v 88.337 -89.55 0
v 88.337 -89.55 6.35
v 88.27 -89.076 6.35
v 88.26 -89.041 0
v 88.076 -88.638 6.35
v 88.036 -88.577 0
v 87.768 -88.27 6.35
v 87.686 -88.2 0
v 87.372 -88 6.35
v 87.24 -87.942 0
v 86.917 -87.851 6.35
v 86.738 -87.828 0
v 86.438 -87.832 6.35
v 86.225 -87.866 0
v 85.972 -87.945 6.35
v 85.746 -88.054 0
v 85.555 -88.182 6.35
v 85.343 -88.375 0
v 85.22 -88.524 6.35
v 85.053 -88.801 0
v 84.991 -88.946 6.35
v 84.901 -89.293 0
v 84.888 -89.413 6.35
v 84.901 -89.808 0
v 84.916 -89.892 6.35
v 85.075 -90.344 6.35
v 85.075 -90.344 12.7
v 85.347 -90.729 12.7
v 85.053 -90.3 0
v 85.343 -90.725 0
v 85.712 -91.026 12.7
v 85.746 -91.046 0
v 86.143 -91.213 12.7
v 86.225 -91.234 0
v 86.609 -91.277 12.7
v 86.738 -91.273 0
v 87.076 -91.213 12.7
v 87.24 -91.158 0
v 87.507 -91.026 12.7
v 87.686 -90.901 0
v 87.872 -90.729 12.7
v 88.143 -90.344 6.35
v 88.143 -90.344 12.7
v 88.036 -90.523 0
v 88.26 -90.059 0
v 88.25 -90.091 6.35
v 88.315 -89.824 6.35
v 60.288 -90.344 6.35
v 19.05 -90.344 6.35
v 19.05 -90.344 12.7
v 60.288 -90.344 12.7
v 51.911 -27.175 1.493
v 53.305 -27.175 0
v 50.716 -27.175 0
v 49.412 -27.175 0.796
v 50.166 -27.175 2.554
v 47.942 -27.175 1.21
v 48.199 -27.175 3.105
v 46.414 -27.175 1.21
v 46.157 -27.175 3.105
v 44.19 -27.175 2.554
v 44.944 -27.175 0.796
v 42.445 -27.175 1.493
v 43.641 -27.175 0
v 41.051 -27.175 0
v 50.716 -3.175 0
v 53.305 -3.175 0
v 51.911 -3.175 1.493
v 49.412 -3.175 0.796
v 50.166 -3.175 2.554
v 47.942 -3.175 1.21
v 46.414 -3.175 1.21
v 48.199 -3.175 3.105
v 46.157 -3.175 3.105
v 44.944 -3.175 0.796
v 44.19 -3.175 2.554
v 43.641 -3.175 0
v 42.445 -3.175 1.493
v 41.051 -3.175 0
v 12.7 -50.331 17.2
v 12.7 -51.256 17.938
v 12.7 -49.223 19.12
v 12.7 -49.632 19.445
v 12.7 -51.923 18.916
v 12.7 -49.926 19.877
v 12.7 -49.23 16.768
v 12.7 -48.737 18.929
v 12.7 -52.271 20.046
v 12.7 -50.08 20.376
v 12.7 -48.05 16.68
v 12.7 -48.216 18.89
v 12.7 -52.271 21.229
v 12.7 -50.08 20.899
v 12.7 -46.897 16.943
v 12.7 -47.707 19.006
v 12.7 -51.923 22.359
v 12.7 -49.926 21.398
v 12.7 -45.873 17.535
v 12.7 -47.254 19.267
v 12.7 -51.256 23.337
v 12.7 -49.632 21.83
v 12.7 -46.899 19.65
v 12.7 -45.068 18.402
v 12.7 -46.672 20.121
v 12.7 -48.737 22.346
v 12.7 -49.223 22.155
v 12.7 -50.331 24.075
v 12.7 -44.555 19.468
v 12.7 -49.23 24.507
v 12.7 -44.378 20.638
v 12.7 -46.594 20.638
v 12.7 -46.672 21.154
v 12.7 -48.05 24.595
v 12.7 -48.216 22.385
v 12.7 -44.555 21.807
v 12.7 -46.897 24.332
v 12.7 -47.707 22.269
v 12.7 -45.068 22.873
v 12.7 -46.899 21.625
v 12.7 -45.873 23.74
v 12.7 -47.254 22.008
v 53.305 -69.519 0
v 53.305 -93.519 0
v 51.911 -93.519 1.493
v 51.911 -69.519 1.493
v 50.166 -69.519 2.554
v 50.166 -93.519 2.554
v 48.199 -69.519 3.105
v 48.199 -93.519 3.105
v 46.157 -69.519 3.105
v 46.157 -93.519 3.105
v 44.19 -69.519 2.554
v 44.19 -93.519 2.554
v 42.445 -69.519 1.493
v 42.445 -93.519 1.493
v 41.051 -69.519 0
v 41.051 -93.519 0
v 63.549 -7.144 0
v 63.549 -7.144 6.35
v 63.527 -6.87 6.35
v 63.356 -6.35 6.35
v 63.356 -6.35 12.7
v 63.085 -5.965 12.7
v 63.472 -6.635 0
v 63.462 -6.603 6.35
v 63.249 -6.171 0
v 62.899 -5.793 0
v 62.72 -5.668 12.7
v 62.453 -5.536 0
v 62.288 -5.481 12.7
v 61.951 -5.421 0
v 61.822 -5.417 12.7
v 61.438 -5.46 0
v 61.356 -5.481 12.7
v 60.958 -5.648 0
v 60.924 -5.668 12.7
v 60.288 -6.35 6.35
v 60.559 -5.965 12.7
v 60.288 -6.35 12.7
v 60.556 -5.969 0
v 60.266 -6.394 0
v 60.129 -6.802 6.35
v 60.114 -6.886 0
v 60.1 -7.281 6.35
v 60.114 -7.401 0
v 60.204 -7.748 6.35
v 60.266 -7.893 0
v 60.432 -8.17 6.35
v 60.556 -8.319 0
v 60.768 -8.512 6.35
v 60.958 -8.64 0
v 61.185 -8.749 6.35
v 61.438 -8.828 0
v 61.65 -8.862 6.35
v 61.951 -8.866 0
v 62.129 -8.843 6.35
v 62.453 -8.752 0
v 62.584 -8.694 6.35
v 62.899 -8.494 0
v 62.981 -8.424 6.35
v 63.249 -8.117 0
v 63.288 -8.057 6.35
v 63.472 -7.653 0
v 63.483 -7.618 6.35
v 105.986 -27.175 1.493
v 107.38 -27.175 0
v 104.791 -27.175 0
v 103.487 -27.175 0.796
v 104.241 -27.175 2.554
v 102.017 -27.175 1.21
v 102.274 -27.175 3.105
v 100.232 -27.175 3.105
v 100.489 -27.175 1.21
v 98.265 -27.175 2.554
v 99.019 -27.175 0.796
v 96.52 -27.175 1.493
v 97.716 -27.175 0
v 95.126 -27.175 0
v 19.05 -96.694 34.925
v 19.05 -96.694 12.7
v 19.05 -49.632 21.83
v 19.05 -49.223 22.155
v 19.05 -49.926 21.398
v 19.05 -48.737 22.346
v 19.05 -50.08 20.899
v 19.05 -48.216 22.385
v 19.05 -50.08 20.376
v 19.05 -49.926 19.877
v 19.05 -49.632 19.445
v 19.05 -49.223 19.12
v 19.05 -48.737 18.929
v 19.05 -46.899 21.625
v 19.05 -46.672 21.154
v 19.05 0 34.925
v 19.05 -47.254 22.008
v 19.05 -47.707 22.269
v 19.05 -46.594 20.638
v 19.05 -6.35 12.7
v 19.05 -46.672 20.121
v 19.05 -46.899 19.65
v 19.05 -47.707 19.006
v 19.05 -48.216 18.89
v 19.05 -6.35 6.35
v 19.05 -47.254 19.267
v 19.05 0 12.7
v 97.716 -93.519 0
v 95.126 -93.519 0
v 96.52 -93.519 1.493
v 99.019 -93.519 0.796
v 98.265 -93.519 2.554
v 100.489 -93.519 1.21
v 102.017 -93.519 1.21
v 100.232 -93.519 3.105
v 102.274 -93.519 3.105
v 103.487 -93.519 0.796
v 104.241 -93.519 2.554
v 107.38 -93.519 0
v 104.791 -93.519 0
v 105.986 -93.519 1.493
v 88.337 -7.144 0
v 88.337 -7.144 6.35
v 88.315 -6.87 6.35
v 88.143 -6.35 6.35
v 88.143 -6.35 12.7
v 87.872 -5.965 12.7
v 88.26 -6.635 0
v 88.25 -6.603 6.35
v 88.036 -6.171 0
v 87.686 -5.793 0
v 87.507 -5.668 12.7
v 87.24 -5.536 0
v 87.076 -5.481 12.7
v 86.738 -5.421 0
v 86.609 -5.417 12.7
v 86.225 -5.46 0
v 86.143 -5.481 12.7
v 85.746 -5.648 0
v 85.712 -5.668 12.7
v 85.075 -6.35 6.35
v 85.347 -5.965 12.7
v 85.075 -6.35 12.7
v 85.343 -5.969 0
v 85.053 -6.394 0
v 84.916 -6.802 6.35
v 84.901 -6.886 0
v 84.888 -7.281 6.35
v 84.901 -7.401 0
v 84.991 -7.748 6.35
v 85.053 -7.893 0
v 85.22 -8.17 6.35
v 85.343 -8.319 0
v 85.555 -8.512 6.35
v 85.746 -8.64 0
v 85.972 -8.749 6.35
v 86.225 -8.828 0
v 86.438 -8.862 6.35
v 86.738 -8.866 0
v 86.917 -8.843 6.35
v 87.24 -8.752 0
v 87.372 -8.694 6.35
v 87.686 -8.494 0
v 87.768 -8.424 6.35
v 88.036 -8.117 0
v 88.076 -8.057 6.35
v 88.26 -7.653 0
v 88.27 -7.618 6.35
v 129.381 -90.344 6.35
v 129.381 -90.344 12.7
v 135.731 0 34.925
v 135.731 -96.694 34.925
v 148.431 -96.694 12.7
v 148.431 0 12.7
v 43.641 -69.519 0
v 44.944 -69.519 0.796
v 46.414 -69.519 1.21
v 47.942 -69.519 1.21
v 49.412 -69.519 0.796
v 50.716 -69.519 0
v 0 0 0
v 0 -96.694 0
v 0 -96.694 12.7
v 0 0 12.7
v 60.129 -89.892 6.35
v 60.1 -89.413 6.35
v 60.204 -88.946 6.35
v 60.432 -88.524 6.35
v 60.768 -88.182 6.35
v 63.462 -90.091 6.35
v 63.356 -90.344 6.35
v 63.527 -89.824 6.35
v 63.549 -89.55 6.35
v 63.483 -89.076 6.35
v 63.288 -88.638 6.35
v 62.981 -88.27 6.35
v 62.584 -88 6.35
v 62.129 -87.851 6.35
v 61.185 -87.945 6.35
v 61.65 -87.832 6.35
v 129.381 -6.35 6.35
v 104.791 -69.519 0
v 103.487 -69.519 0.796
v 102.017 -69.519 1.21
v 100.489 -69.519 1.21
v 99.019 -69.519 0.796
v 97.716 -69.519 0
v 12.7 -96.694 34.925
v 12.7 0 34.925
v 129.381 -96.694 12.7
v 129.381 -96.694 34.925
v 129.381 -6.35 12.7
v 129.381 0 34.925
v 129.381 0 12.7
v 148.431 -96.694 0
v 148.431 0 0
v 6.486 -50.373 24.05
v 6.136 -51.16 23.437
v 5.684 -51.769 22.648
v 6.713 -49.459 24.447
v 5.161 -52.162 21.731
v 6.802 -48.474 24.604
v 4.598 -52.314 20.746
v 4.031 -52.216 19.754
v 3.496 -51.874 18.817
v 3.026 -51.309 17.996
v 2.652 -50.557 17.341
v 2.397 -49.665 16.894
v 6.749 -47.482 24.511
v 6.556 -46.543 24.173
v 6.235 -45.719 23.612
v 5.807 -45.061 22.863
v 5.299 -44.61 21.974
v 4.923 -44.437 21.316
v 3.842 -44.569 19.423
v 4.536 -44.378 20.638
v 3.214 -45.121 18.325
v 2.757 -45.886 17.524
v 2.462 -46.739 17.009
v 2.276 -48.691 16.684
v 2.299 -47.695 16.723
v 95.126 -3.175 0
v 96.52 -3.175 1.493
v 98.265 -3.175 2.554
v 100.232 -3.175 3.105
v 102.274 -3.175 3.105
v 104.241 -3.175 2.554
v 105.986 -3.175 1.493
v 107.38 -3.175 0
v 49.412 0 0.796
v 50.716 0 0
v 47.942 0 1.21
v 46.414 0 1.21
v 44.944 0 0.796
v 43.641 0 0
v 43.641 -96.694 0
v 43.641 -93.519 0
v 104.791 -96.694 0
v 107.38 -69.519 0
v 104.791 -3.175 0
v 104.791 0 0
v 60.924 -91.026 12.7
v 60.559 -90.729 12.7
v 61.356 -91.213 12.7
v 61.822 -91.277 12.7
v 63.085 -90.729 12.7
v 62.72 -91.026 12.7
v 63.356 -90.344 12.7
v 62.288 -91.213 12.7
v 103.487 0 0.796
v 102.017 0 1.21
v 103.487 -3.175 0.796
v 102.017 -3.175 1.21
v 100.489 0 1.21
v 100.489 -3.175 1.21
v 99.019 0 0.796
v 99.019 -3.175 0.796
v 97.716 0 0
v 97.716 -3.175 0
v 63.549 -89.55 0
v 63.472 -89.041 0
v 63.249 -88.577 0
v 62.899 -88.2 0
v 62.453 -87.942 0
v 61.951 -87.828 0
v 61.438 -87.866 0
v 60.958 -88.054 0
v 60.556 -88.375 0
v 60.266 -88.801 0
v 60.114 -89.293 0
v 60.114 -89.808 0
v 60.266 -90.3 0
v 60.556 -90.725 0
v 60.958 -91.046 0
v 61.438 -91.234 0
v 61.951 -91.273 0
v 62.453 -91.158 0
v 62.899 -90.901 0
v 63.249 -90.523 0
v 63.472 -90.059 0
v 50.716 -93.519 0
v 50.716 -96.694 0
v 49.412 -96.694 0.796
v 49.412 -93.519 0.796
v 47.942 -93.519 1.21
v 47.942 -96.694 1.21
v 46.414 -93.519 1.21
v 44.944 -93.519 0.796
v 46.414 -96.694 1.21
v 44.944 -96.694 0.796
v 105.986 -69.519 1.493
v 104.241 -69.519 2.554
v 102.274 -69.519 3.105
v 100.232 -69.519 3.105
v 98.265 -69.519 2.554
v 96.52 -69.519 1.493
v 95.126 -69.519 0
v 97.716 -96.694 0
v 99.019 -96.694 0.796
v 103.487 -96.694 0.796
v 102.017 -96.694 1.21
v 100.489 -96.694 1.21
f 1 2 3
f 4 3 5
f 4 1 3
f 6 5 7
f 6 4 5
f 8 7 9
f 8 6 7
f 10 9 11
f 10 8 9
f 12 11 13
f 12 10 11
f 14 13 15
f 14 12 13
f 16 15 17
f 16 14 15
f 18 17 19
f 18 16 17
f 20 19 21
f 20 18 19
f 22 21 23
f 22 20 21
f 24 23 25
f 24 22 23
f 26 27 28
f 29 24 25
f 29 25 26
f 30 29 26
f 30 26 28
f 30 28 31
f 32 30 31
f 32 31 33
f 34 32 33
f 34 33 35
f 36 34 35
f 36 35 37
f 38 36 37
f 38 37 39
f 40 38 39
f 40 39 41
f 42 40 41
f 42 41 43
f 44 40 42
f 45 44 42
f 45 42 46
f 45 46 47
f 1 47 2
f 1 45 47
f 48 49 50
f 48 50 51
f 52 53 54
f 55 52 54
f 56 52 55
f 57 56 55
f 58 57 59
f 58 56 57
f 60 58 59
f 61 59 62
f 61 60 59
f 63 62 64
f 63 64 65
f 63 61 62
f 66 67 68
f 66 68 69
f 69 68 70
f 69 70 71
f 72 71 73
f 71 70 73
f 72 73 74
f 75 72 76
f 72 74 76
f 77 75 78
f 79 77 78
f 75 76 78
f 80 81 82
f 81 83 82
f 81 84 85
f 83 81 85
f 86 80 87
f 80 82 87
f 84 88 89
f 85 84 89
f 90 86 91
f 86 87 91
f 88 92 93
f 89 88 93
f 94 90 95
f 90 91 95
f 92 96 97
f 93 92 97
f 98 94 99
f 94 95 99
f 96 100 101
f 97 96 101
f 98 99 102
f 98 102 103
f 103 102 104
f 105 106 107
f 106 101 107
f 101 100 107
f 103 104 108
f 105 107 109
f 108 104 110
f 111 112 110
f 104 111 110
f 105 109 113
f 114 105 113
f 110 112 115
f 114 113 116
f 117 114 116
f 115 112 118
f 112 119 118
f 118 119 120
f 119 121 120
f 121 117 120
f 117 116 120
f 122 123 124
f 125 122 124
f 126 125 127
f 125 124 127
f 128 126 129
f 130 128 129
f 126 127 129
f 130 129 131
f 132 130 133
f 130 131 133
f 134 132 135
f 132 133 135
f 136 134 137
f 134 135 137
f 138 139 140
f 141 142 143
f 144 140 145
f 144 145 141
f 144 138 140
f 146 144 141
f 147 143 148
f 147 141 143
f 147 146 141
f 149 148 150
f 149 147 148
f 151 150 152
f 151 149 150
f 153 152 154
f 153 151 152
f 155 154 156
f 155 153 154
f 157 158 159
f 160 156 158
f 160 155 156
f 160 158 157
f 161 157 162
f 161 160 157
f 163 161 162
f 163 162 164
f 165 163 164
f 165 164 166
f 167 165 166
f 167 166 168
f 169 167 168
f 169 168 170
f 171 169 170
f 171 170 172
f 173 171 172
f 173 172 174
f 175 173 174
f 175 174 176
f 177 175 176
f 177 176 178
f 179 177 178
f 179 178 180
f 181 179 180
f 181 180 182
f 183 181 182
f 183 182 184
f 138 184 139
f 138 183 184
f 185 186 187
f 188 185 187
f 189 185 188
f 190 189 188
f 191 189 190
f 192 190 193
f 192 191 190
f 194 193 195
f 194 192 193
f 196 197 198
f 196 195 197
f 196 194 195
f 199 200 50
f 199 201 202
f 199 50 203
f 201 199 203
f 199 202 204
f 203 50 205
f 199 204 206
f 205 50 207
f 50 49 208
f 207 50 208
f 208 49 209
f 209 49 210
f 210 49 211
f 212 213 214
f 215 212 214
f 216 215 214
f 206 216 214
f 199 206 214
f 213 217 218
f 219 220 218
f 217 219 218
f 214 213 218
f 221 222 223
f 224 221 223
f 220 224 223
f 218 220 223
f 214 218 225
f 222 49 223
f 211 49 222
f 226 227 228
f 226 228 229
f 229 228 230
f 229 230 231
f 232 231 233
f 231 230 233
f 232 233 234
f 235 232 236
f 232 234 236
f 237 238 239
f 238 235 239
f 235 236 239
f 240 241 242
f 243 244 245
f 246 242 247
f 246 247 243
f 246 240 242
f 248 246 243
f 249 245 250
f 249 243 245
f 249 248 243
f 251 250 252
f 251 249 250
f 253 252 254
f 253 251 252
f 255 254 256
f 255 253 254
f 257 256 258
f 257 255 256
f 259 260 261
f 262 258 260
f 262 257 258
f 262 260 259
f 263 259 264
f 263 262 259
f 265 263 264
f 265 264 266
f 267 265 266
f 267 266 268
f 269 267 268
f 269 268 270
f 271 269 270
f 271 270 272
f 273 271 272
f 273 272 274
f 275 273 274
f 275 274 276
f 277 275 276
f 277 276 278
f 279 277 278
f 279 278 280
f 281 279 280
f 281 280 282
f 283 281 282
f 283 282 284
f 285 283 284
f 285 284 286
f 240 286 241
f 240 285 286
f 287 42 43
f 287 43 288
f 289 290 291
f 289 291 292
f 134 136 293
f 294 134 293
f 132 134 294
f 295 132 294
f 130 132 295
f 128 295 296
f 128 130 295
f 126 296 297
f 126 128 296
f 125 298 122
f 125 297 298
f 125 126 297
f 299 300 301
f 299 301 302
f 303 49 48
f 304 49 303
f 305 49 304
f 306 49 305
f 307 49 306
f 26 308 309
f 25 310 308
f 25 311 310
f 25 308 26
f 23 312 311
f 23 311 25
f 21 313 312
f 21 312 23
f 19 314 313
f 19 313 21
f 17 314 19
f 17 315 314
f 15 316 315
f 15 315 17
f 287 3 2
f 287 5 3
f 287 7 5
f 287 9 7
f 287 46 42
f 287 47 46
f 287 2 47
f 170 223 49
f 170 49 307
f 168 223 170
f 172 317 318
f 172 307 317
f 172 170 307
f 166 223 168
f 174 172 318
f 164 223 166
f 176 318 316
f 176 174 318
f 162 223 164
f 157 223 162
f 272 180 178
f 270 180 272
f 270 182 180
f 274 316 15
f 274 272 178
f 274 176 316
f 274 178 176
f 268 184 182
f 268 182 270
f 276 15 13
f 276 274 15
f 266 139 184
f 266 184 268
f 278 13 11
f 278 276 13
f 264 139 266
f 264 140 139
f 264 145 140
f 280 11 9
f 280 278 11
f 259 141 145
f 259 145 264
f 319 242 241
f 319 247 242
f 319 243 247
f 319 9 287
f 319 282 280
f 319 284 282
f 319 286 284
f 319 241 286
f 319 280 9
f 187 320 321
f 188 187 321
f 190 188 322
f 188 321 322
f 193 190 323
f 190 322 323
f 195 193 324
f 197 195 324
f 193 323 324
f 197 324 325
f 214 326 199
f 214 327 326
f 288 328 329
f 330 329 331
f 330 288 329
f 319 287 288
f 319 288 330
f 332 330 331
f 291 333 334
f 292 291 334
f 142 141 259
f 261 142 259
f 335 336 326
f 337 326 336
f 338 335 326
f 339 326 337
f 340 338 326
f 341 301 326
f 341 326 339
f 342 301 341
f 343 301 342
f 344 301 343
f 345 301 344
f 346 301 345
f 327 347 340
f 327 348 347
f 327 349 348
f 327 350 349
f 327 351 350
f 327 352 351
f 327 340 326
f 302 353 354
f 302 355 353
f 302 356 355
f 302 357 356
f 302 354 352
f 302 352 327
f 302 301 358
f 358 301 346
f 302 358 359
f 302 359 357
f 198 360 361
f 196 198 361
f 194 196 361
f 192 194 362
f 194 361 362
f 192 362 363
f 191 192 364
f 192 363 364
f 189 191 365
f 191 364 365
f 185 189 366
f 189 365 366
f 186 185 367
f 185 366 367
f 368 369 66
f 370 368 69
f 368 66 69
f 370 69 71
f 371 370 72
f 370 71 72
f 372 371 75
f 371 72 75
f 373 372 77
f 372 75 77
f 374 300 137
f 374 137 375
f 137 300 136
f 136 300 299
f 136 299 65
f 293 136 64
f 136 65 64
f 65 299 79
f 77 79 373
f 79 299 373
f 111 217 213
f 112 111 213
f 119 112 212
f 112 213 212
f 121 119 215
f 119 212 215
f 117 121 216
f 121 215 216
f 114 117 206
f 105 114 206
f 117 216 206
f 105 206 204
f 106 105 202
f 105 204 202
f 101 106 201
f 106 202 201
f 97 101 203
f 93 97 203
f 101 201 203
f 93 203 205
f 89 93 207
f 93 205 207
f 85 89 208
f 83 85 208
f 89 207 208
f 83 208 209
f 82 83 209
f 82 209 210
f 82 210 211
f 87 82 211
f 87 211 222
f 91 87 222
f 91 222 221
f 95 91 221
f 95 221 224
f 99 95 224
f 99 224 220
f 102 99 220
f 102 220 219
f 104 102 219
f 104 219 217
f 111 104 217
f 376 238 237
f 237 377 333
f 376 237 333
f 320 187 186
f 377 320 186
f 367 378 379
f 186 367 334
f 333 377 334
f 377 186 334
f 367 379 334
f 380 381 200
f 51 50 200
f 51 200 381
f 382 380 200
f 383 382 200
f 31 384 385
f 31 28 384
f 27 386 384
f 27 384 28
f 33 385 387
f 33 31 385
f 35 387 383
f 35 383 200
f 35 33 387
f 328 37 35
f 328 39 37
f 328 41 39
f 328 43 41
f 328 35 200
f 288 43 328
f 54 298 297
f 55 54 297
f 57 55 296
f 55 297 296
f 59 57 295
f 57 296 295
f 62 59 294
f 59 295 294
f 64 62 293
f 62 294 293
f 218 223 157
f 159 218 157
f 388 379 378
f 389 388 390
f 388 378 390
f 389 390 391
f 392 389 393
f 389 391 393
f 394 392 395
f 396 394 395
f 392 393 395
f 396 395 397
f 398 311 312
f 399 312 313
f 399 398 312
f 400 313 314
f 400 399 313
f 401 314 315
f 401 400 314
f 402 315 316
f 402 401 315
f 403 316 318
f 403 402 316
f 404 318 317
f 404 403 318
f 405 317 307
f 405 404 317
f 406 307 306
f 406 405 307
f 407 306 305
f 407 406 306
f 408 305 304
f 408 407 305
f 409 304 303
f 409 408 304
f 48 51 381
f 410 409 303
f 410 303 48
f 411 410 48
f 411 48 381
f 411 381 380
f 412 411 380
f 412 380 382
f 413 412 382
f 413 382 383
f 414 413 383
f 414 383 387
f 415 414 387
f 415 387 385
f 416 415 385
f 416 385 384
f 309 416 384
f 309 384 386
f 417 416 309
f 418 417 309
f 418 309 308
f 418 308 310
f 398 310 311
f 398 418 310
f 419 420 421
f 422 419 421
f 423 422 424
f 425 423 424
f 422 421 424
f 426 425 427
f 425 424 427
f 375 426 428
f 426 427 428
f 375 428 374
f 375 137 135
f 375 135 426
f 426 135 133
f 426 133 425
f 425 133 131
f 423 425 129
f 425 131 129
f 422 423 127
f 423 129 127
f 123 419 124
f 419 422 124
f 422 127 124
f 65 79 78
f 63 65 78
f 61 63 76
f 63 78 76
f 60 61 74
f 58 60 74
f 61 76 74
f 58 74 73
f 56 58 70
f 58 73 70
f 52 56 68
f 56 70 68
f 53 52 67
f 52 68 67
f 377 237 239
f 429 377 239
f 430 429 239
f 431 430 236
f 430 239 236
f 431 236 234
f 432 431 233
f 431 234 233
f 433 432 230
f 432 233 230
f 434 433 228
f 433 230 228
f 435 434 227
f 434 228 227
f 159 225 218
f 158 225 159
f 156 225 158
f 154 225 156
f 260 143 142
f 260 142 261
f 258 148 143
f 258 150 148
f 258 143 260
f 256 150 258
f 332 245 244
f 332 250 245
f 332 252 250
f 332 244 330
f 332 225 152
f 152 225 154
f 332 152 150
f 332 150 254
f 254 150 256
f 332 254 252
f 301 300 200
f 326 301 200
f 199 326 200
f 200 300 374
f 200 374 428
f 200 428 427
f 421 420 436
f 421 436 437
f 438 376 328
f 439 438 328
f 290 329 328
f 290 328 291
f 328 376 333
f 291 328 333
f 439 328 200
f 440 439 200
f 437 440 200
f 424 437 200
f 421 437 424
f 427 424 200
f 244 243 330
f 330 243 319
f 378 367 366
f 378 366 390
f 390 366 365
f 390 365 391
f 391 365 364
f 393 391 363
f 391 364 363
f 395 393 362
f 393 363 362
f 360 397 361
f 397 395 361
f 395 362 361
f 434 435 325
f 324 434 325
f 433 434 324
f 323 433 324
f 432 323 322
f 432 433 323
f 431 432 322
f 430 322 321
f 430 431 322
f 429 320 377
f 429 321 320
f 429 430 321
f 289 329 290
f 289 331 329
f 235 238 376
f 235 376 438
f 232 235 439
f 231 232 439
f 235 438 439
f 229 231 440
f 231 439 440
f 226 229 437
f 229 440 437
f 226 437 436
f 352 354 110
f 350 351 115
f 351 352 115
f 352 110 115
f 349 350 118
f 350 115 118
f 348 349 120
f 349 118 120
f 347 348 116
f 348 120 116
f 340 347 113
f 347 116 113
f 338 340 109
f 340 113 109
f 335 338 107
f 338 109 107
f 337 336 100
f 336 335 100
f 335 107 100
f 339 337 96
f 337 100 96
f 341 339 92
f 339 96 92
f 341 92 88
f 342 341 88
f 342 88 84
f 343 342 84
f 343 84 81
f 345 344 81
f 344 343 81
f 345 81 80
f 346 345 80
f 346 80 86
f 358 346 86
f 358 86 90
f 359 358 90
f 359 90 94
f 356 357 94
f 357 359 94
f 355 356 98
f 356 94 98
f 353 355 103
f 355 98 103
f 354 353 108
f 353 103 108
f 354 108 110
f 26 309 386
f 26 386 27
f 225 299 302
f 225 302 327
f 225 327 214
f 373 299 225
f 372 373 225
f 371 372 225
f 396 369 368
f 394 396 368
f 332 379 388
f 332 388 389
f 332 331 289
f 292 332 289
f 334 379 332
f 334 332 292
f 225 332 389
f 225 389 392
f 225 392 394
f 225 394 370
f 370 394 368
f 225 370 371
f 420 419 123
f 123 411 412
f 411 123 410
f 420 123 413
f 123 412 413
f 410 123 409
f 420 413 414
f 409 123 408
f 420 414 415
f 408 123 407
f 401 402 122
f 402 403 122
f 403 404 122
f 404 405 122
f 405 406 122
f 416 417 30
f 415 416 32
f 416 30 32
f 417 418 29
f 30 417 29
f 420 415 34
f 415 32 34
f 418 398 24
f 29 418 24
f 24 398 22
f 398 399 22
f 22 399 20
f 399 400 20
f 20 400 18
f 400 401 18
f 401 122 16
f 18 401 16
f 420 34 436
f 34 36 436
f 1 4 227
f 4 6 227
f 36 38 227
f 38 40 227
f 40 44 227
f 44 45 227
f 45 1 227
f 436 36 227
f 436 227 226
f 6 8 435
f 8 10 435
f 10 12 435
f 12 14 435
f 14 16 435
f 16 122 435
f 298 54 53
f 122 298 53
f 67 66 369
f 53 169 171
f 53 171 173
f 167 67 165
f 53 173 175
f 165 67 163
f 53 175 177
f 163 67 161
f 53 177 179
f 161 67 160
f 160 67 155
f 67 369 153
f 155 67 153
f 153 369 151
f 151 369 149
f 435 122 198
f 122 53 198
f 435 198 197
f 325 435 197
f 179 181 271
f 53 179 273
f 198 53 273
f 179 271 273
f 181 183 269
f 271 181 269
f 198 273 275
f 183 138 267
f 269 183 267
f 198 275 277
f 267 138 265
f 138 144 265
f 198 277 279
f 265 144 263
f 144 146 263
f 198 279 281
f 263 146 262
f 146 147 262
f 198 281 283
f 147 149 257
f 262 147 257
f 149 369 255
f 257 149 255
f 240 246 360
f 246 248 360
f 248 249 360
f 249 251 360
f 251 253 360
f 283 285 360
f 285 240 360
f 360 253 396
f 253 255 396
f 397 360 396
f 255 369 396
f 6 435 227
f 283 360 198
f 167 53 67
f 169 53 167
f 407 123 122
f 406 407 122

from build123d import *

# Parameters (mm, degrees)
F0_W      = 148.43125
F0_H      = 96.6940154
F0_R      = 1.7272
F1_DEPTH  = 6.35
F2_W      = 148.43125
F2_H      = 96.6940154
F2_W_2    = 110.33125
F2_H_2    = 83.9940154
F3_DEPTH  = 6.35
F4_W      = 19.05
F4_H      = 96.6940154
F5_DEPTH  = 22.225
F6_SIZE2  = 22.225
F6_SIZE   = 12.7
F7_SIZE2  = 12.7
F7_SIZE   = 22.225
F8_R      = 1.7526
F9_DEPTH  = 16.5157714286
F12_DEPTH = 24
F15_DEPTH = 24
F17_R     = 3.96875
F18_DEPTH = 11.4321428571
F19_DEPTH = 6.35
F20_R     = 5.587492
F21_DEPTH = 96.6940154


with BuildPart() as f1:
    # F0 (on Top) → F1 (new body)
    with BuildSketch(Plane.XY):
        with Locations((74.215625, -48.3470077)):
            Rectangle(F0_W, F0_H)
        with Locations((61.8218728, -89.5502654)):
            Circle(F0_R, mode=Mode.SUBTRACT)
        with Locations((86.6093772, -89.5502654)):
            Circle(F0_R, mode=Mode.SUBTRACT)
        with Locations((61.8218728, -7.14375)):
            Circle(F0_R, mode=Mode.SUBTRACT)
        with Locations((86.6093772, -7.14375)):
            Circle(F0_R, mode=Mode.SUBTRACT)
    extrude(amount=F1_DEPTH)

    # F2 (on face) → F3 (join)
    with BuildSketch(Plane.XY.offset(6.35)):
        with Locations((74.215625, -48.3470077)):
            Rectangle(F2_W, F2_H)
        with Locations((74.215625, -48.3470077)):
            Rectangle(F2_W_2, F2_H_2, mode=Mode.SUBTRACT)
    extrude(amount=F3_DEPTH)

    # F4 (on face) → F5 (join)
    with BuildSketch(Plane.XY.offset(12.7)):
        with Locations((9.525, -48.3470077)):
            Rectangle(F4_W, F4_H)
        with Locations((138.90625, -48.3470077)):
            Rectangle(F4_W, F4_H)
    extrude(amount=F5_DEPTH)

    # F6
    f6_edges = [f1.edges().sort_by_distance(p)[0] for p in [
        (0, -48.347008, 34.925),
    ]]
    f6_side = f1.faces().sort_by_distance((9.525, -48.347008, 34.925))[0]
    chamfer(f6_edges, length=F6_SIZE, length2=F6_SIZE2, reference=f6_side)

    # F7
    f7_edges = [f1.edges().sort_by_distance(p)[0] for p in [
        (148.43125, -48.347008, 34.925),
    ]]
    f7_side = f1.faces().sort_by_distance((148.43125, -48.347008, 17.4625))[0]
    chamfer(f7_edges, length=F7_SIZE, length2=F7_SIZE2, reference=f7_side)

    # F8 (on face) → F9 (cut, up to face)
    with BuildSketch(Plane.YZ.offset(19.05)):
        with Locations((-48.3470077, 20.6375)):
            Circle(F8_R)
    extrude(amount=-F9_DEPTH, mode=Mode.SUBTRACT)

    # F11 (on offset) → F12 (cut)
    with BuildSketch(Plane(origin=(0, -3.175, 0), x_dir=(-1, 0, 0), z_dir=(0, 1, 0))):
        with BuildLine():
            Line((-53.3054687, 0), (-41.0507815, 0))
            ThreePointArc((-41.0507815, 0), (-47.1781251, 3.1749959066), (-53.3054687, 0))
        make_face()
        with BuildLine():
            ThreePointArc((-95.1257813, 0), (-101.2531249, 3.1749959066), (-107.3804685, 0))
            Line((-107.3804685, 0), (-95.1257813, 0))
        make_face()
    extrude(amount=-F12_DEPTH, mode=Mode.SUBTRACT)

    # F14 (on offset) → F15 (cut)
    with BuildSketch(Plane.XZ.offset(93.5190154)):
        with BuildLine():
            ThreePointArc((53.3054687, 0), (47.1781251, 3.1749959066), (41.0507815, 0))
            Line((41.0507815, 0), (53.3054687, 0))
        make_face()
        with BuildLine():
            ThreePointArc((107.3804685, 0), (101.2531249, 3.1749959066), (95.1257813, 0))
            Line((95.1257813, 0), (107.3804685, 0))
        make_face()
    extrude(amount=-F15_DEPTH, mode=Mode.SUBTRACT)

    # F17 (on offset) → F18 (cut, up to face)
    with BuildSketch(Plane.YZ.offset(12.7)):
        with Locations((-48.3470077, 20.6375)):
            Circle(F17_R)
    extrude(amount=-F18_DEPTH, mode=Mode.SUBTRACT)

    # F19 (cut, through all): faces of the model
    f19_faces = [f1.faces().sort_by_distance(p)[0] for p in [
        (61.8218728, -90.7276702983, 6.35),
        (86.6093772, -90.7276702983, 6.35),
        (86.6093772, -5.9663451017, 6.35),
        (61.8218728, -5.9663451017, 6.35),
    ]]
    extrude(f19_faces, amount=-F19_DEPTH, mode=Mode.SUBTRACT)

    # F20 (on face) → F21 (cut, through all)
    with BuildSketch(Plane.XZ.offset(96.6940154)):
        with Locations((47.1781251, -4.3250040934)):
            Circle(F20_R)
        with Locations((101.2531249, -4.3250040934)):
            Circle(F20_R)
    extrude(amount=-F21_DEPTH, mode=Mode.SUBTRACT)


solid = f1.part
